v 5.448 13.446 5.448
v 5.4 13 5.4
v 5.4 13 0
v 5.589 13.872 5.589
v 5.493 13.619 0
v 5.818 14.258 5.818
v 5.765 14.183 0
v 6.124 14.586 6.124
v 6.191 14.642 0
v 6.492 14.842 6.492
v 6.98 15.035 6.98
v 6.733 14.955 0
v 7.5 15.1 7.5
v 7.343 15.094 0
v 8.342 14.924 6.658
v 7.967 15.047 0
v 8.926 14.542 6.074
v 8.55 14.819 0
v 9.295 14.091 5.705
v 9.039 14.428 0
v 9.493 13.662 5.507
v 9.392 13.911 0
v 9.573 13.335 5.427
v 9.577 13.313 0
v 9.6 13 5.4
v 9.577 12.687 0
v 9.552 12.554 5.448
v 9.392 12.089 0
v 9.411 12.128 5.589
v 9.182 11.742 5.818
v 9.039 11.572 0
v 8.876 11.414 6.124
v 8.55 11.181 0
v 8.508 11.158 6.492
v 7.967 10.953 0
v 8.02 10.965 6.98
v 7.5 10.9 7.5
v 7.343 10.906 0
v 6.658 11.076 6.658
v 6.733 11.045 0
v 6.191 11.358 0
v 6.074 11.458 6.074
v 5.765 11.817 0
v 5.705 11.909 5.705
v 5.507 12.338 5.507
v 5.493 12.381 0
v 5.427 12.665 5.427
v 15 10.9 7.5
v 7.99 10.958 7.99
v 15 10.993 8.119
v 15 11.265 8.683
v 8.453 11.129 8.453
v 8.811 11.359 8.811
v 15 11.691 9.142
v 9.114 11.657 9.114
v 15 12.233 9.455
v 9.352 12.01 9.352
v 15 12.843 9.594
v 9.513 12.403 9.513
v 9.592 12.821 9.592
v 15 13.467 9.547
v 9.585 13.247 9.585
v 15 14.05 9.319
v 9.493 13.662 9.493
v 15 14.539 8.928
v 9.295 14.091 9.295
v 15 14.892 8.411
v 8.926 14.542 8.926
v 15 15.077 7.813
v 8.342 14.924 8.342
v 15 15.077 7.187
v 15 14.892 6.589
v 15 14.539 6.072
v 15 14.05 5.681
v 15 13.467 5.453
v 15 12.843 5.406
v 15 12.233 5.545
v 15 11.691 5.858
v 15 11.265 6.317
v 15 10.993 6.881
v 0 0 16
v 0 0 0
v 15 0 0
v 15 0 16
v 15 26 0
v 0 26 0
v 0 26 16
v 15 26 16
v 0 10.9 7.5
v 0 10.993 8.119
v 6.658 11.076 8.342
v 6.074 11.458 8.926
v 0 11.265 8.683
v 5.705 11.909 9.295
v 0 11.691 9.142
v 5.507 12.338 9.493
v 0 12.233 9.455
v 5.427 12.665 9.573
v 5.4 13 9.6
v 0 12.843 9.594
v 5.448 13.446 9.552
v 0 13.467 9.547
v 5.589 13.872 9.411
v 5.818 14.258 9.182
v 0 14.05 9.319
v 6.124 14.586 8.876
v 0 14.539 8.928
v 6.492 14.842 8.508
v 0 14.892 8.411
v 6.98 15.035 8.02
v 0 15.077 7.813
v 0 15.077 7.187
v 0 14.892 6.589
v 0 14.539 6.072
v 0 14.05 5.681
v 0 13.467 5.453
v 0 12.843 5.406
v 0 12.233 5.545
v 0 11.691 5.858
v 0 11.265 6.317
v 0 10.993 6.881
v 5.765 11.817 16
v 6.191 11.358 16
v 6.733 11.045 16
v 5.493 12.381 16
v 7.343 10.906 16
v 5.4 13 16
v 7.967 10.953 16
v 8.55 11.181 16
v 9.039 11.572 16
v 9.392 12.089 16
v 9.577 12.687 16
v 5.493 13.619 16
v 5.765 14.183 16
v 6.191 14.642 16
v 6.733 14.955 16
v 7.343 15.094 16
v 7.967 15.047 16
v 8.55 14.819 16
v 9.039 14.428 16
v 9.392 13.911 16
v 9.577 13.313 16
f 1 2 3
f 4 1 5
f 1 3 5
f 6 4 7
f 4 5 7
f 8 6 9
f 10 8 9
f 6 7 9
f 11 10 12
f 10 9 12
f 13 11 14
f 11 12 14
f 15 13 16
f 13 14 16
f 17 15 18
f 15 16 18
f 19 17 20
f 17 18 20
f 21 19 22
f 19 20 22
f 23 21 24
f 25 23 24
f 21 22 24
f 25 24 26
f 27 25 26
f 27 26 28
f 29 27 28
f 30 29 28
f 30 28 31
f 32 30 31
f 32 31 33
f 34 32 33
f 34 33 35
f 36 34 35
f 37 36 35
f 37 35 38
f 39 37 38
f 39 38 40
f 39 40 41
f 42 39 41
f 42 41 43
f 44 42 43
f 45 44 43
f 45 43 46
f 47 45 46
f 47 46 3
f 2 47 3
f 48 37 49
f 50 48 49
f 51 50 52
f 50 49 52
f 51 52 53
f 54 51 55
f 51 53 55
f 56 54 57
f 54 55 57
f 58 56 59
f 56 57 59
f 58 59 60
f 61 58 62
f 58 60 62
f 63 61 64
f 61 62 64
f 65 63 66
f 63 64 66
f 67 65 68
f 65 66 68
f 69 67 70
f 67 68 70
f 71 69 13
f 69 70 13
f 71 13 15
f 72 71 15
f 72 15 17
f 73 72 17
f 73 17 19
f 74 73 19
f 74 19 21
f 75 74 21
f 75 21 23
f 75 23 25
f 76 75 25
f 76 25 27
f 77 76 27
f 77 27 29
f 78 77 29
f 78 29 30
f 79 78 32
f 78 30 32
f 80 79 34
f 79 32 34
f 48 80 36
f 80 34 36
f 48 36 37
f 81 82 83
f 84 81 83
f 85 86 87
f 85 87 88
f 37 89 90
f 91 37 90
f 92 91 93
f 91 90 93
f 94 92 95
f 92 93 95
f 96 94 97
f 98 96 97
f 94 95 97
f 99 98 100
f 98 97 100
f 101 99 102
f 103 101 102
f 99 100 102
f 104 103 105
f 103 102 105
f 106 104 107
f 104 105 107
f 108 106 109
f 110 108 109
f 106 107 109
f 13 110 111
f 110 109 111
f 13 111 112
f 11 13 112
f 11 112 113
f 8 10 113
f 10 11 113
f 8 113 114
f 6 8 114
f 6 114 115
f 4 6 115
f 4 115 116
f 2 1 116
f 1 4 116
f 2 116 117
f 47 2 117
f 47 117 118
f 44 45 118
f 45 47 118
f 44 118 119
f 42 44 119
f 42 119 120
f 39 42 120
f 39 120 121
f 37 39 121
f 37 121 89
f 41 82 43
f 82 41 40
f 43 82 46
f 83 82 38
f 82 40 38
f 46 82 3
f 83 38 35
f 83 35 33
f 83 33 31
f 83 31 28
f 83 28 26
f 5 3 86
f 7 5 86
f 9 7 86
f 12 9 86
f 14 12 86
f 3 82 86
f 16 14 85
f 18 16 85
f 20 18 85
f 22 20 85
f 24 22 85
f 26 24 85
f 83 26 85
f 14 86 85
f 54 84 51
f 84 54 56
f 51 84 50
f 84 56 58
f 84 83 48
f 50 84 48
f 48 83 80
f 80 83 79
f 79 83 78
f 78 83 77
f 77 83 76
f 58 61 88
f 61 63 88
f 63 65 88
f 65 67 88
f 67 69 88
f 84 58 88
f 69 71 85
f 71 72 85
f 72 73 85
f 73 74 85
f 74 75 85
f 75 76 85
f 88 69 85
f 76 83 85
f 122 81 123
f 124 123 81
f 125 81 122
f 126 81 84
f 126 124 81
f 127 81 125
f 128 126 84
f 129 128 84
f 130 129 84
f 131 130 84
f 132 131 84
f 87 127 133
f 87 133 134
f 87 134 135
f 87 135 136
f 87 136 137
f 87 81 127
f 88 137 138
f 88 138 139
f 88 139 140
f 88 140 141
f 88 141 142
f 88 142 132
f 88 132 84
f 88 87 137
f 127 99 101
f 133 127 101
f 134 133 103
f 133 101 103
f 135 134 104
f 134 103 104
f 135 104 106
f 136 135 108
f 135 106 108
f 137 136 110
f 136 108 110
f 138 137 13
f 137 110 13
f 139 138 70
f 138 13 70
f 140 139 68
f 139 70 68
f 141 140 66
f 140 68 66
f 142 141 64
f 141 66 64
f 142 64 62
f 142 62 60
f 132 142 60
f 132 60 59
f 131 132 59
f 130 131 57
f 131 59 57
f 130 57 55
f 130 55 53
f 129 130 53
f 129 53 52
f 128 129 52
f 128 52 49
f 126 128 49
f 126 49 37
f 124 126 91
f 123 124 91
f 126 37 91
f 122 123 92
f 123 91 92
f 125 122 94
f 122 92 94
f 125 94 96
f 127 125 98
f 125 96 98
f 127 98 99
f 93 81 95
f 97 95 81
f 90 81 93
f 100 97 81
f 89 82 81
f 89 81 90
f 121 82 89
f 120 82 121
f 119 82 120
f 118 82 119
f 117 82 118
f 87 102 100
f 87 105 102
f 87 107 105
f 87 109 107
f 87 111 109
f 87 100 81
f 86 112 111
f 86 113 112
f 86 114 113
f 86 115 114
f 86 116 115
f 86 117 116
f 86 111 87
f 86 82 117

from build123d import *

# Parameters (mm, degrees)
F0_W     = 15
F0_H     = 26
F1_DEPTH = 16
F3_D     = 4.2
F5_D     = 4.2


with BuildPart() as f1:
    # F0 (on Top) → F1 (new body)
    with BuildSketch(Plane.XY):
        with Locations((7.5, 13)):
            Rectangle(F0_W, F0_H)
    extrude(amount=F1_DEPTH)

    # F3 (through all)
    with Locations(Plane.XY.offset(16)):
        with Locations((7.5, 13)):
            Hole(F3_D / 2)

    # F5 (through all)
    with Locations(Plane.YZ.offset(15)):
        with Locations((13, 7.5)):
            Hole(F5_D / 2)


solid = f1.part
